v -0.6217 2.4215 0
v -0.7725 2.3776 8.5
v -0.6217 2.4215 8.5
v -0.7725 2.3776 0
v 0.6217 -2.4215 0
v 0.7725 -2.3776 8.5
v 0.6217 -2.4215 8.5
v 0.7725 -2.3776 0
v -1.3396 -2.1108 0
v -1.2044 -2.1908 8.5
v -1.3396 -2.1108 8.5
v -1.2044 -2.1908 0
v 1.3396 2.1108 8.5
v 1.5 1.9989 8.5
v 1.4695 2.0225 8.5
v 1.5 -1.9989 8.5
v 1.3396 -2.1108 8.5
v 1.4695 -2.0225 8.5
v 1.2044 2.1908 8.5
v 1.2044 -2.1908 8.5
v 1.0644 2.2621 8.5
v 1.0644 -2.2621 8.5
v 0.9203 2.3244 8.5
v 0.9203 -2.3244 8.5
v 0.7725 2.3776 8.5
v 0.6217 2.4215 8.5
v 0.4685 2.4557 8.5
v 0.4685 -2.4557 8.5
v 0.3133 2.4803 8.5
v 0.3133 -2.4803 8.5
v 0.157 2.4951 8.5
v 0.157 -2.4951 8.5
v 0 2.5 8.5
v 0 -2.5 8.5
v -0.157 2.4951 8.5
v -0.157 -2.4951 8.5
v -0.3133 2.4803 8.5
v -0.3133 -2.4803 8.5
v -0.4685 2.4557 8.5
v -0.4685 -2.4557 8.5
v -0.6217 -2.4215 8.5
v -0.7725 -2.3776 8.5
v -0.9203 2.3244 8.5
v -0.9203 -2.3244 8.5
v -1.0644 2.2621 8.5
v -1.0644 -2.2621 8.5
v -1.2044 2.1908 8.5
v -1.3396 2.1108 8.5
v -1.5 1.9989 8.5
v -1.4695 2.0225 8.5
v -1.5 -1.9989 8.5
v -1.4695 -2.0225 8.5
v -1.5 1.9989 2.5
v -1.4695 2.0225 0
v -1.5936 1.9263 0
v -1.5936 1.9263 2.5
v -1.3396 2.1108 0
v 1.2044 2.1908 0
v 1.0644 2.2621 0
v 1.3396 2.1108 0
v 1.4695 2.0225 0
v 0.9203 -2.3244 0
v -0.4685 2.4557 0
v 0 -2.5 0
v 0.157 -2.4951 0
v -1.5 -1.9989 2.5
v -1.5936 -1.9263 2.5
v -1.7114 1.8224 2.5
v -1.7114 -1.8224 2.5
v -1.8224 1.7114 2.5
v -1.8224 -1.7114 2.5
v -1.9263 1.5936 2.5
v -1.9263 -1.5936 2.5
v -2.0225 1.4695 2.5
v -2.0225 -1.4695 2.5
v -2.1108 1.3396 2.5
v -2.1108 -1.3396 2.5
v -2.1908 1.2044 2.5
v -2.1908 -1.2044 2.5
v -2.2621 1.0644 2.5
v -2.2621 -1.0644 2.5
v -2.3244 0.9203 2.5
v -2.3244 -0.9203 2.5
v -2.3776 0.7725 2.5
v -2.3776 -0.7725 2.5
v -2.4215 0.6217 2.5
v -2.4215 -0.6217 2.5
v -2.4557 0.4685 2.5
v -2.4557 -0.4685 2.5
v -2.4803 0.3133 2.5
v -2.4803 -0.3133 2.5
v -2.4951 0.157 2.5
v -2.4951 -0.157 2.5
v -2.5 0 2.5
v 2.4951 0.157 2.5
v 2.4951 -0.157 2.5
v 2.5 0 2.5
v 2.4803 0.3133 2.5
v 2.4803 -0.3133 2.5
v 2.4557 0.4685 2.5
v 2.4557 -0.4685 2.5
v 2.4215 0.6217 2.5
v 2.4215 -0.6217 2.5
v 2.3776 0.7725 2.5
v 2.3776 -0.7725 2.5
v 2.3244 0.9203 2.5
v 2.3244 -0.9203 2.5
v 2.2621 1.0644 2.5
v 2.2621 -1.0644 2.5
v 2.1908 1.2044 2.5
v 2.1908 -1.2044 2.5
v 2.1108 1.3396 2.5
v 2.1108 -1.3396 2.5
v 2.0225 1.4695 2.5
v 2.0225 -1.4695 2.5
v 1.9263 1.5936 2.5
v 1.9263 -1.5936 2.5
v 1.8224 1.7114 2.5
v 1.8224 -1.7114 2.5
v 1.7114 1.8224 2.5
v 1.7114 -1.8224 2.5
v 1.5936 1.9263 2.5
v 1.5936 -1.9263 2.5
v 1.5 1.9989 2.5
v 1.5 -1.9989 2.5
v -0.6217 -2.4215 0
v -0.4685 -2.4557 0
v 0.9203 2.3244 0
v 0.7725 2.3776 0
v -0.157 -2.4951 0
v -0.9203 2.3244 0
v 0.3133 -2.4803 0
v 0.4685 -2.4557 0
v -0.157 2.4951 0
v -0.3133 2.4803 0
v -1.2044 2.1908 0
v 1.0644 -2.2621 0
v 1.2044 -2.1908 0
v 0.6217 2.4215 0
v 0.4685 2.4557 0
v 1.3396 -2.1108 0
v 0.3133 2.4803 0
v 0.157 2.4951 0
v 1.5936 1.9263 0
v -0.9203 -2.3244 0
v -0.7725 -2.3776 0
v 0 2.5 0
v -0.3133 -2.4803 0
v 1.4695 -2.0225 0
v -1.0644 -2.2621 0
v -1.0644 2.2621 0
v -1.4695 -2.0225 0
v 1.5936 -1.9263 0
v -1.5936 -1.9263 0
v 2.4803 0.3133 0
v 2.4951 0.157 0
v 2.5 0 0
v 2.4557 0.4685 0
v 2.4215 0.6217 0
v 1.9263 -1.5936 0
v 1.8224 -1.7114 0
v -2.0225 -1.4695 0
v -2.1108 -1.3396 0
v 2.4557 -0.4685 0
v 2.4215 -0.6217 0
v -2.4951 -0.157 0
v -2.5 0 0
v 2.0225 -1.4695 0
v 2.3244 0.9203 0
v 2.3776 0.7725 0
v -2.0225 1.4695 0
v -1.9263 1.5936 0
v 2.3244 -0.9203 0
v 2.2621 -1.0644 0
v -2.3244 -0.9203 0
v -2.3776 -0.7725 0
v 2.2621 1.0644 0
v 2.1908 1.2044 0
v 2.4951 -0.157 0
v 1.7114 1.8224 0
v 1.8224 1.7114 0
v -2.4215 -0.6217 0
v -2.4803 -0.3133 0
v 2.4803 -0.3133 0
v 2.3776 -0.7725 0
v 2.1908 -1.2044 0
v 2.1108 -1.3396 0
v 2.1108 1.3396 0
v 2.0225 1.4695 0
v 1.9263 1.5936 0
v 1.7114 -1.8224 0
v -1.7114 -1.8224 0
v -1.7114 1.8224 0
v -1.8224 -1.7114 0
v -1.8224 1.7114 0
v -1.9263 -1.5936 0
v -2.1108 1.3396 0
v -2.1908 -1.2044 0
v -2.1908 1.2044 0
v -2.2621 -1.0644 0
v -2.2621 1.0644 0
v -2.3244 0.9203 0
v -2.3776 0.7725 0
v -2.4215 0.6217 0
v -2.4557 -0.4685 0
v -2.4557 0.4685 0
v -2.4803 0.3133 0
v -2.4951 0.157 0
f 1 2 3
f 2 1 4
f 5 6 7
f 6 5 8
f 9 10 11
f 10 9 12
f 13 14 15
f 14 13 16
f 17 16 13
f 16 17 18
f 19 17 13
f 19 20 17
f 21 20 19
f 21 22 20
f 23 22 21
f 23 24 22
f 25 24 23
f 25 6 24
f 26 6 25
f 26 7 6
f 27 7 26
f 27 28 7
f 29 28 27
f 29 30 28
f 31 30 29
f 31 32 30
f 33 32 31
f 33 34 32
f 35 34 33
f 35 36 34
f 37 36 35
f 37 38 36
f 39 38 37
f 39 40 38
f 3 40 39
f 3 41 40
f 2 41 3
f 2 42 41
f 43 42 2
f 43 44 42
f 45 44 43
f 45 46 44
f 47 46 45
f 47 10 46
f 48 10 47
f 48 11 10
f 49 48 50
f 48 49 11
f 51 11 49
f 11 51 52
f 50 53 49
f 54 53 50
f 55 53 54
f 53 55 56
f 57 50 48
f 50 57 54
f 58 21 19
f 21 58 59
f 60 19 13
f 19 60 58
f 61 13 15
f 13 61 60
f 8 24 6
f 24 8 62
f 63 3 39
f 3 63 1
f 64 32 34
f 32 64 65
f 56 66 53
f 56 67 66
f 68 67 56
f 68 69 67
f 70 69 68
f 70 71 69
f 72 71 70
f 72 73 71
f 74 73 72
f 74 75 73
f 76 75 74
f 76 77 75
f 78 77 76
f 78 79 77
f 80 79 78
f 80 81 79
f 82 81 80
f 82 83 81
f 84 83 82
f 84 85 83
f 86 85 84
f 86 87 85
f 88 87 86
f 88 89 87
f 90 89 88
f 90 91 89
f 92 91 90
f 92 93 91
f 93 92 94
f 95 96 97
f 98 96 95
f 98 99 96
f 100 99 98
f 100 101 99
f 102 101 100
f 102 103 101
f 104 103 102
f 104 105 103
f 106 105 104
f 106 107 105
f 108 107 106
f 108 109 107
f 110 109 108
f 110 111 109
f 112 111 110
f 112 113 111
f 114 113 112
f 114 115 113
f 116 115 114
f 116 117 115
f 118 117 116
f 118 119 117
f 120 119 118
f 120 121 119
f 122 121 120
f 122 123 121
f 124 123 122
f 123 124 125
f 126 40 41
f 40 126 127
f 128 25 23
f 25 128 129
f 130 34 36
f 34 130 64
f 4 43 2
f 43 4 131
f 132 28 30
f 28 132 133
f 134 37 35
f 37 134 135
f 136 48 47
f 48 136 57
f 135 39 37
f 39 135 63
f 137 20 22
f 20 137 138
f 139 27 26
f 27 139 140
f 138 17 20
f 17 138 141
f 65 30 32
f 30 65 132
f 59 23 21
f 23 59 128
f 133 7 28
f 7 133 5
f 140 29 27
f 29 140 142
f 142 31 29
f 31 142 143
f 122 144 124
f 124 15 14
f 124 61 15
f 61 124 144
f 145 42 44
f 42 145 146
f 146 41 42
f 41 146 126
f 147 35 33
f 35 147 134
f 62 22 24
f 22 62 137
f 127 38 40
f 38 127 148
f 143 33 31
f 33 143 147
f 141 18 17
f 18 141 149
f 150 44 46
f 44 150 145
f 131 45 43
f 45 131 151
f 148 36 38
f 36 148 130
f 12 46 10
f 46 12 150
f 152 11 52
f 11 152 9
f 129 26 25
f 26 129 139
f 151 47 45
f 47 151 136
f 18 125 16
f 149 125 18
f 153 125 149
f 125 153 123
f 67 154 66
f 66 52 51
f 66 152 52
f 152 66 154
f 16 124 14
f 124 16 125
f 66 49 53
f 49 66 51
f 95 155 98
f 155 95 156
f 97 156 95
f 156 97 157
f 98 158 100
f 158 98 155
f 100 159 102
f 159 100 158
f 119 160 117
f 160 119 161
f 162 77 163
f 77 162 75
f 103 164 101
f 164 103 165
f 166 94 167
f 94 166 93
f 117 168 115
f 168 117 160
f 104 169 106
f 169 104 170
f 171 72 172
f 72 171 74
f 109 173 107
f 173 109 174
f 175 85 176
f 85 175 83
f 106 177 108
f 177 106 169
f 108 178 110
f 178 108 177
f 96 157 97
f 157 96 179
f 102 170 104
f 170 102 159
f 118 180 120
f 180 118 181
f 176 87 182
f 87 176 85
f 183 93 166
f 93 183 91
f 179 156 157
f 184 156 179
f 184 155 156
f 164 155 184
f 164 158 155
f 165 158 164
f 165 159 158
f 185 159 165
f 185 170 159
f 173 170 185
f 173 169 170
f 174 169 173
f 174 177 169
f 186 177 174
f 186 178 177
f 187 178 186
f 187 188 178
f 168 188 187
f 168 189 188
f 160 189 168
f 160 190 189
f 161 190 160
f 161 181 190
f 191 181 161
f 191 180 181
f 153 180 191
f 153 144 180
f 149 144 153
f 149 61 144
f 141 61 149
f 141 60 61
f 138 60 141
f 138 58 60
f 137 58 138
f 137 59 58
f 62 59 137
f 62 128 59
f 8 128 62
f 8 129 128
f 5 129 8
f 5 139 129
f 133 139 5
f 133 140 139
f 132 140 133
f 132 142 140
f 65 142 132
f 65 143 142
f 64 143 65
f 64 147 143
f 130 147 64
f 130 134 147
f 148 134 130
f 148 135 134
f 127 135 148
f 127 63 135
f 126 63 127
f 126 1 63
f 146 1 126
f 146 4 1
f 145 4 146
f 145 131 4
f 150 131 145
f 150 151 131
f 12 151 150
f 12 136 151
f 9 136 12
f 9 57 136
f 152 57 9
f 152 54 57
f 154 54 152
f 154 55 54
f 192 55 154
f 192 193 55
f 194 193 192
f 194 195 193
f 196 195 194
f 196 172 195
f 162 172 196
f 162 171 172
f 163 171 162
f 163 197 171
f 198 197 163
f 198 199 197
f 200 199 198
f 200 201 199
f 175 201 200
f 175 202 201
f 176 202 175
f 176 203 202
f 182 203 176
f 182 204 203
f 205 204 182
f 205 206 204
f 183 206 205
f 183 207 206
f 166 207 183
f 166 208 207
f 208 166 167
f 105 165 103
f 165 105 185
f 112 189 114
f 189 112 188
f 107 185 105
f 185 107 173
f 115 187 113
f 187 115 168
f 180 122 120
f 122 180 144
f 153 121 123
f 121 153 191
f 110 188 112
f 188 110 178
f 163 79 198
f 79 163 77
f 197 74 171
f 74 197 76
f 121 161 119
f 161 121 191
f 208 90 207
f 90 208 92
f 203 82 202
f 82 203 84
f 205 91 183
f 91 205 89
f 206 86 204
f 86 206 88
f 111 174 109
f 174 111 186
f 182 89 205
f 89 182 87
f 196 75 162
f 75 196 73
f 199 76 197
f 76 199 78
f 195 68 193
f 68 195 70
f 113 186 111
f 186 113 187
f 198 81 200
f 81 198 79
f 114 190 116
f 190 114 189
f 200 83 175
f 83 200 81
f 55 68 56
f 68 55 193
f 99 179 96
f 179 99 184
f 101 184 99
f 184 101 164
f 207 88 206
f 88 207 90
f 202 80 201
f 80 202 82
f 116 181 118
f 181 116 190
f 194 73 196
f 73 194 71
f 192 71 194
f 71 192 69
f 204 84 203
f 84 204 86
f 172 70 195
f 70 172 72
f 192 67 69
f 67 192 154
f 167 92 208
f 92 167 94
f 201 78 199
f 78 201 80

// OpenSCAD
    //shaft
    cylinder(h=2.5, r1=2.5, r2=2.5, center=false, $fn=100);
    translate([0, 0, 2.5])
    intersection() {
      cylinder(h=6, r1=2.5, r2=2.5, center=false, $fn=100);
      translate([-1.5, -5, 0.0])
      cube([3,10,6]);
    }
